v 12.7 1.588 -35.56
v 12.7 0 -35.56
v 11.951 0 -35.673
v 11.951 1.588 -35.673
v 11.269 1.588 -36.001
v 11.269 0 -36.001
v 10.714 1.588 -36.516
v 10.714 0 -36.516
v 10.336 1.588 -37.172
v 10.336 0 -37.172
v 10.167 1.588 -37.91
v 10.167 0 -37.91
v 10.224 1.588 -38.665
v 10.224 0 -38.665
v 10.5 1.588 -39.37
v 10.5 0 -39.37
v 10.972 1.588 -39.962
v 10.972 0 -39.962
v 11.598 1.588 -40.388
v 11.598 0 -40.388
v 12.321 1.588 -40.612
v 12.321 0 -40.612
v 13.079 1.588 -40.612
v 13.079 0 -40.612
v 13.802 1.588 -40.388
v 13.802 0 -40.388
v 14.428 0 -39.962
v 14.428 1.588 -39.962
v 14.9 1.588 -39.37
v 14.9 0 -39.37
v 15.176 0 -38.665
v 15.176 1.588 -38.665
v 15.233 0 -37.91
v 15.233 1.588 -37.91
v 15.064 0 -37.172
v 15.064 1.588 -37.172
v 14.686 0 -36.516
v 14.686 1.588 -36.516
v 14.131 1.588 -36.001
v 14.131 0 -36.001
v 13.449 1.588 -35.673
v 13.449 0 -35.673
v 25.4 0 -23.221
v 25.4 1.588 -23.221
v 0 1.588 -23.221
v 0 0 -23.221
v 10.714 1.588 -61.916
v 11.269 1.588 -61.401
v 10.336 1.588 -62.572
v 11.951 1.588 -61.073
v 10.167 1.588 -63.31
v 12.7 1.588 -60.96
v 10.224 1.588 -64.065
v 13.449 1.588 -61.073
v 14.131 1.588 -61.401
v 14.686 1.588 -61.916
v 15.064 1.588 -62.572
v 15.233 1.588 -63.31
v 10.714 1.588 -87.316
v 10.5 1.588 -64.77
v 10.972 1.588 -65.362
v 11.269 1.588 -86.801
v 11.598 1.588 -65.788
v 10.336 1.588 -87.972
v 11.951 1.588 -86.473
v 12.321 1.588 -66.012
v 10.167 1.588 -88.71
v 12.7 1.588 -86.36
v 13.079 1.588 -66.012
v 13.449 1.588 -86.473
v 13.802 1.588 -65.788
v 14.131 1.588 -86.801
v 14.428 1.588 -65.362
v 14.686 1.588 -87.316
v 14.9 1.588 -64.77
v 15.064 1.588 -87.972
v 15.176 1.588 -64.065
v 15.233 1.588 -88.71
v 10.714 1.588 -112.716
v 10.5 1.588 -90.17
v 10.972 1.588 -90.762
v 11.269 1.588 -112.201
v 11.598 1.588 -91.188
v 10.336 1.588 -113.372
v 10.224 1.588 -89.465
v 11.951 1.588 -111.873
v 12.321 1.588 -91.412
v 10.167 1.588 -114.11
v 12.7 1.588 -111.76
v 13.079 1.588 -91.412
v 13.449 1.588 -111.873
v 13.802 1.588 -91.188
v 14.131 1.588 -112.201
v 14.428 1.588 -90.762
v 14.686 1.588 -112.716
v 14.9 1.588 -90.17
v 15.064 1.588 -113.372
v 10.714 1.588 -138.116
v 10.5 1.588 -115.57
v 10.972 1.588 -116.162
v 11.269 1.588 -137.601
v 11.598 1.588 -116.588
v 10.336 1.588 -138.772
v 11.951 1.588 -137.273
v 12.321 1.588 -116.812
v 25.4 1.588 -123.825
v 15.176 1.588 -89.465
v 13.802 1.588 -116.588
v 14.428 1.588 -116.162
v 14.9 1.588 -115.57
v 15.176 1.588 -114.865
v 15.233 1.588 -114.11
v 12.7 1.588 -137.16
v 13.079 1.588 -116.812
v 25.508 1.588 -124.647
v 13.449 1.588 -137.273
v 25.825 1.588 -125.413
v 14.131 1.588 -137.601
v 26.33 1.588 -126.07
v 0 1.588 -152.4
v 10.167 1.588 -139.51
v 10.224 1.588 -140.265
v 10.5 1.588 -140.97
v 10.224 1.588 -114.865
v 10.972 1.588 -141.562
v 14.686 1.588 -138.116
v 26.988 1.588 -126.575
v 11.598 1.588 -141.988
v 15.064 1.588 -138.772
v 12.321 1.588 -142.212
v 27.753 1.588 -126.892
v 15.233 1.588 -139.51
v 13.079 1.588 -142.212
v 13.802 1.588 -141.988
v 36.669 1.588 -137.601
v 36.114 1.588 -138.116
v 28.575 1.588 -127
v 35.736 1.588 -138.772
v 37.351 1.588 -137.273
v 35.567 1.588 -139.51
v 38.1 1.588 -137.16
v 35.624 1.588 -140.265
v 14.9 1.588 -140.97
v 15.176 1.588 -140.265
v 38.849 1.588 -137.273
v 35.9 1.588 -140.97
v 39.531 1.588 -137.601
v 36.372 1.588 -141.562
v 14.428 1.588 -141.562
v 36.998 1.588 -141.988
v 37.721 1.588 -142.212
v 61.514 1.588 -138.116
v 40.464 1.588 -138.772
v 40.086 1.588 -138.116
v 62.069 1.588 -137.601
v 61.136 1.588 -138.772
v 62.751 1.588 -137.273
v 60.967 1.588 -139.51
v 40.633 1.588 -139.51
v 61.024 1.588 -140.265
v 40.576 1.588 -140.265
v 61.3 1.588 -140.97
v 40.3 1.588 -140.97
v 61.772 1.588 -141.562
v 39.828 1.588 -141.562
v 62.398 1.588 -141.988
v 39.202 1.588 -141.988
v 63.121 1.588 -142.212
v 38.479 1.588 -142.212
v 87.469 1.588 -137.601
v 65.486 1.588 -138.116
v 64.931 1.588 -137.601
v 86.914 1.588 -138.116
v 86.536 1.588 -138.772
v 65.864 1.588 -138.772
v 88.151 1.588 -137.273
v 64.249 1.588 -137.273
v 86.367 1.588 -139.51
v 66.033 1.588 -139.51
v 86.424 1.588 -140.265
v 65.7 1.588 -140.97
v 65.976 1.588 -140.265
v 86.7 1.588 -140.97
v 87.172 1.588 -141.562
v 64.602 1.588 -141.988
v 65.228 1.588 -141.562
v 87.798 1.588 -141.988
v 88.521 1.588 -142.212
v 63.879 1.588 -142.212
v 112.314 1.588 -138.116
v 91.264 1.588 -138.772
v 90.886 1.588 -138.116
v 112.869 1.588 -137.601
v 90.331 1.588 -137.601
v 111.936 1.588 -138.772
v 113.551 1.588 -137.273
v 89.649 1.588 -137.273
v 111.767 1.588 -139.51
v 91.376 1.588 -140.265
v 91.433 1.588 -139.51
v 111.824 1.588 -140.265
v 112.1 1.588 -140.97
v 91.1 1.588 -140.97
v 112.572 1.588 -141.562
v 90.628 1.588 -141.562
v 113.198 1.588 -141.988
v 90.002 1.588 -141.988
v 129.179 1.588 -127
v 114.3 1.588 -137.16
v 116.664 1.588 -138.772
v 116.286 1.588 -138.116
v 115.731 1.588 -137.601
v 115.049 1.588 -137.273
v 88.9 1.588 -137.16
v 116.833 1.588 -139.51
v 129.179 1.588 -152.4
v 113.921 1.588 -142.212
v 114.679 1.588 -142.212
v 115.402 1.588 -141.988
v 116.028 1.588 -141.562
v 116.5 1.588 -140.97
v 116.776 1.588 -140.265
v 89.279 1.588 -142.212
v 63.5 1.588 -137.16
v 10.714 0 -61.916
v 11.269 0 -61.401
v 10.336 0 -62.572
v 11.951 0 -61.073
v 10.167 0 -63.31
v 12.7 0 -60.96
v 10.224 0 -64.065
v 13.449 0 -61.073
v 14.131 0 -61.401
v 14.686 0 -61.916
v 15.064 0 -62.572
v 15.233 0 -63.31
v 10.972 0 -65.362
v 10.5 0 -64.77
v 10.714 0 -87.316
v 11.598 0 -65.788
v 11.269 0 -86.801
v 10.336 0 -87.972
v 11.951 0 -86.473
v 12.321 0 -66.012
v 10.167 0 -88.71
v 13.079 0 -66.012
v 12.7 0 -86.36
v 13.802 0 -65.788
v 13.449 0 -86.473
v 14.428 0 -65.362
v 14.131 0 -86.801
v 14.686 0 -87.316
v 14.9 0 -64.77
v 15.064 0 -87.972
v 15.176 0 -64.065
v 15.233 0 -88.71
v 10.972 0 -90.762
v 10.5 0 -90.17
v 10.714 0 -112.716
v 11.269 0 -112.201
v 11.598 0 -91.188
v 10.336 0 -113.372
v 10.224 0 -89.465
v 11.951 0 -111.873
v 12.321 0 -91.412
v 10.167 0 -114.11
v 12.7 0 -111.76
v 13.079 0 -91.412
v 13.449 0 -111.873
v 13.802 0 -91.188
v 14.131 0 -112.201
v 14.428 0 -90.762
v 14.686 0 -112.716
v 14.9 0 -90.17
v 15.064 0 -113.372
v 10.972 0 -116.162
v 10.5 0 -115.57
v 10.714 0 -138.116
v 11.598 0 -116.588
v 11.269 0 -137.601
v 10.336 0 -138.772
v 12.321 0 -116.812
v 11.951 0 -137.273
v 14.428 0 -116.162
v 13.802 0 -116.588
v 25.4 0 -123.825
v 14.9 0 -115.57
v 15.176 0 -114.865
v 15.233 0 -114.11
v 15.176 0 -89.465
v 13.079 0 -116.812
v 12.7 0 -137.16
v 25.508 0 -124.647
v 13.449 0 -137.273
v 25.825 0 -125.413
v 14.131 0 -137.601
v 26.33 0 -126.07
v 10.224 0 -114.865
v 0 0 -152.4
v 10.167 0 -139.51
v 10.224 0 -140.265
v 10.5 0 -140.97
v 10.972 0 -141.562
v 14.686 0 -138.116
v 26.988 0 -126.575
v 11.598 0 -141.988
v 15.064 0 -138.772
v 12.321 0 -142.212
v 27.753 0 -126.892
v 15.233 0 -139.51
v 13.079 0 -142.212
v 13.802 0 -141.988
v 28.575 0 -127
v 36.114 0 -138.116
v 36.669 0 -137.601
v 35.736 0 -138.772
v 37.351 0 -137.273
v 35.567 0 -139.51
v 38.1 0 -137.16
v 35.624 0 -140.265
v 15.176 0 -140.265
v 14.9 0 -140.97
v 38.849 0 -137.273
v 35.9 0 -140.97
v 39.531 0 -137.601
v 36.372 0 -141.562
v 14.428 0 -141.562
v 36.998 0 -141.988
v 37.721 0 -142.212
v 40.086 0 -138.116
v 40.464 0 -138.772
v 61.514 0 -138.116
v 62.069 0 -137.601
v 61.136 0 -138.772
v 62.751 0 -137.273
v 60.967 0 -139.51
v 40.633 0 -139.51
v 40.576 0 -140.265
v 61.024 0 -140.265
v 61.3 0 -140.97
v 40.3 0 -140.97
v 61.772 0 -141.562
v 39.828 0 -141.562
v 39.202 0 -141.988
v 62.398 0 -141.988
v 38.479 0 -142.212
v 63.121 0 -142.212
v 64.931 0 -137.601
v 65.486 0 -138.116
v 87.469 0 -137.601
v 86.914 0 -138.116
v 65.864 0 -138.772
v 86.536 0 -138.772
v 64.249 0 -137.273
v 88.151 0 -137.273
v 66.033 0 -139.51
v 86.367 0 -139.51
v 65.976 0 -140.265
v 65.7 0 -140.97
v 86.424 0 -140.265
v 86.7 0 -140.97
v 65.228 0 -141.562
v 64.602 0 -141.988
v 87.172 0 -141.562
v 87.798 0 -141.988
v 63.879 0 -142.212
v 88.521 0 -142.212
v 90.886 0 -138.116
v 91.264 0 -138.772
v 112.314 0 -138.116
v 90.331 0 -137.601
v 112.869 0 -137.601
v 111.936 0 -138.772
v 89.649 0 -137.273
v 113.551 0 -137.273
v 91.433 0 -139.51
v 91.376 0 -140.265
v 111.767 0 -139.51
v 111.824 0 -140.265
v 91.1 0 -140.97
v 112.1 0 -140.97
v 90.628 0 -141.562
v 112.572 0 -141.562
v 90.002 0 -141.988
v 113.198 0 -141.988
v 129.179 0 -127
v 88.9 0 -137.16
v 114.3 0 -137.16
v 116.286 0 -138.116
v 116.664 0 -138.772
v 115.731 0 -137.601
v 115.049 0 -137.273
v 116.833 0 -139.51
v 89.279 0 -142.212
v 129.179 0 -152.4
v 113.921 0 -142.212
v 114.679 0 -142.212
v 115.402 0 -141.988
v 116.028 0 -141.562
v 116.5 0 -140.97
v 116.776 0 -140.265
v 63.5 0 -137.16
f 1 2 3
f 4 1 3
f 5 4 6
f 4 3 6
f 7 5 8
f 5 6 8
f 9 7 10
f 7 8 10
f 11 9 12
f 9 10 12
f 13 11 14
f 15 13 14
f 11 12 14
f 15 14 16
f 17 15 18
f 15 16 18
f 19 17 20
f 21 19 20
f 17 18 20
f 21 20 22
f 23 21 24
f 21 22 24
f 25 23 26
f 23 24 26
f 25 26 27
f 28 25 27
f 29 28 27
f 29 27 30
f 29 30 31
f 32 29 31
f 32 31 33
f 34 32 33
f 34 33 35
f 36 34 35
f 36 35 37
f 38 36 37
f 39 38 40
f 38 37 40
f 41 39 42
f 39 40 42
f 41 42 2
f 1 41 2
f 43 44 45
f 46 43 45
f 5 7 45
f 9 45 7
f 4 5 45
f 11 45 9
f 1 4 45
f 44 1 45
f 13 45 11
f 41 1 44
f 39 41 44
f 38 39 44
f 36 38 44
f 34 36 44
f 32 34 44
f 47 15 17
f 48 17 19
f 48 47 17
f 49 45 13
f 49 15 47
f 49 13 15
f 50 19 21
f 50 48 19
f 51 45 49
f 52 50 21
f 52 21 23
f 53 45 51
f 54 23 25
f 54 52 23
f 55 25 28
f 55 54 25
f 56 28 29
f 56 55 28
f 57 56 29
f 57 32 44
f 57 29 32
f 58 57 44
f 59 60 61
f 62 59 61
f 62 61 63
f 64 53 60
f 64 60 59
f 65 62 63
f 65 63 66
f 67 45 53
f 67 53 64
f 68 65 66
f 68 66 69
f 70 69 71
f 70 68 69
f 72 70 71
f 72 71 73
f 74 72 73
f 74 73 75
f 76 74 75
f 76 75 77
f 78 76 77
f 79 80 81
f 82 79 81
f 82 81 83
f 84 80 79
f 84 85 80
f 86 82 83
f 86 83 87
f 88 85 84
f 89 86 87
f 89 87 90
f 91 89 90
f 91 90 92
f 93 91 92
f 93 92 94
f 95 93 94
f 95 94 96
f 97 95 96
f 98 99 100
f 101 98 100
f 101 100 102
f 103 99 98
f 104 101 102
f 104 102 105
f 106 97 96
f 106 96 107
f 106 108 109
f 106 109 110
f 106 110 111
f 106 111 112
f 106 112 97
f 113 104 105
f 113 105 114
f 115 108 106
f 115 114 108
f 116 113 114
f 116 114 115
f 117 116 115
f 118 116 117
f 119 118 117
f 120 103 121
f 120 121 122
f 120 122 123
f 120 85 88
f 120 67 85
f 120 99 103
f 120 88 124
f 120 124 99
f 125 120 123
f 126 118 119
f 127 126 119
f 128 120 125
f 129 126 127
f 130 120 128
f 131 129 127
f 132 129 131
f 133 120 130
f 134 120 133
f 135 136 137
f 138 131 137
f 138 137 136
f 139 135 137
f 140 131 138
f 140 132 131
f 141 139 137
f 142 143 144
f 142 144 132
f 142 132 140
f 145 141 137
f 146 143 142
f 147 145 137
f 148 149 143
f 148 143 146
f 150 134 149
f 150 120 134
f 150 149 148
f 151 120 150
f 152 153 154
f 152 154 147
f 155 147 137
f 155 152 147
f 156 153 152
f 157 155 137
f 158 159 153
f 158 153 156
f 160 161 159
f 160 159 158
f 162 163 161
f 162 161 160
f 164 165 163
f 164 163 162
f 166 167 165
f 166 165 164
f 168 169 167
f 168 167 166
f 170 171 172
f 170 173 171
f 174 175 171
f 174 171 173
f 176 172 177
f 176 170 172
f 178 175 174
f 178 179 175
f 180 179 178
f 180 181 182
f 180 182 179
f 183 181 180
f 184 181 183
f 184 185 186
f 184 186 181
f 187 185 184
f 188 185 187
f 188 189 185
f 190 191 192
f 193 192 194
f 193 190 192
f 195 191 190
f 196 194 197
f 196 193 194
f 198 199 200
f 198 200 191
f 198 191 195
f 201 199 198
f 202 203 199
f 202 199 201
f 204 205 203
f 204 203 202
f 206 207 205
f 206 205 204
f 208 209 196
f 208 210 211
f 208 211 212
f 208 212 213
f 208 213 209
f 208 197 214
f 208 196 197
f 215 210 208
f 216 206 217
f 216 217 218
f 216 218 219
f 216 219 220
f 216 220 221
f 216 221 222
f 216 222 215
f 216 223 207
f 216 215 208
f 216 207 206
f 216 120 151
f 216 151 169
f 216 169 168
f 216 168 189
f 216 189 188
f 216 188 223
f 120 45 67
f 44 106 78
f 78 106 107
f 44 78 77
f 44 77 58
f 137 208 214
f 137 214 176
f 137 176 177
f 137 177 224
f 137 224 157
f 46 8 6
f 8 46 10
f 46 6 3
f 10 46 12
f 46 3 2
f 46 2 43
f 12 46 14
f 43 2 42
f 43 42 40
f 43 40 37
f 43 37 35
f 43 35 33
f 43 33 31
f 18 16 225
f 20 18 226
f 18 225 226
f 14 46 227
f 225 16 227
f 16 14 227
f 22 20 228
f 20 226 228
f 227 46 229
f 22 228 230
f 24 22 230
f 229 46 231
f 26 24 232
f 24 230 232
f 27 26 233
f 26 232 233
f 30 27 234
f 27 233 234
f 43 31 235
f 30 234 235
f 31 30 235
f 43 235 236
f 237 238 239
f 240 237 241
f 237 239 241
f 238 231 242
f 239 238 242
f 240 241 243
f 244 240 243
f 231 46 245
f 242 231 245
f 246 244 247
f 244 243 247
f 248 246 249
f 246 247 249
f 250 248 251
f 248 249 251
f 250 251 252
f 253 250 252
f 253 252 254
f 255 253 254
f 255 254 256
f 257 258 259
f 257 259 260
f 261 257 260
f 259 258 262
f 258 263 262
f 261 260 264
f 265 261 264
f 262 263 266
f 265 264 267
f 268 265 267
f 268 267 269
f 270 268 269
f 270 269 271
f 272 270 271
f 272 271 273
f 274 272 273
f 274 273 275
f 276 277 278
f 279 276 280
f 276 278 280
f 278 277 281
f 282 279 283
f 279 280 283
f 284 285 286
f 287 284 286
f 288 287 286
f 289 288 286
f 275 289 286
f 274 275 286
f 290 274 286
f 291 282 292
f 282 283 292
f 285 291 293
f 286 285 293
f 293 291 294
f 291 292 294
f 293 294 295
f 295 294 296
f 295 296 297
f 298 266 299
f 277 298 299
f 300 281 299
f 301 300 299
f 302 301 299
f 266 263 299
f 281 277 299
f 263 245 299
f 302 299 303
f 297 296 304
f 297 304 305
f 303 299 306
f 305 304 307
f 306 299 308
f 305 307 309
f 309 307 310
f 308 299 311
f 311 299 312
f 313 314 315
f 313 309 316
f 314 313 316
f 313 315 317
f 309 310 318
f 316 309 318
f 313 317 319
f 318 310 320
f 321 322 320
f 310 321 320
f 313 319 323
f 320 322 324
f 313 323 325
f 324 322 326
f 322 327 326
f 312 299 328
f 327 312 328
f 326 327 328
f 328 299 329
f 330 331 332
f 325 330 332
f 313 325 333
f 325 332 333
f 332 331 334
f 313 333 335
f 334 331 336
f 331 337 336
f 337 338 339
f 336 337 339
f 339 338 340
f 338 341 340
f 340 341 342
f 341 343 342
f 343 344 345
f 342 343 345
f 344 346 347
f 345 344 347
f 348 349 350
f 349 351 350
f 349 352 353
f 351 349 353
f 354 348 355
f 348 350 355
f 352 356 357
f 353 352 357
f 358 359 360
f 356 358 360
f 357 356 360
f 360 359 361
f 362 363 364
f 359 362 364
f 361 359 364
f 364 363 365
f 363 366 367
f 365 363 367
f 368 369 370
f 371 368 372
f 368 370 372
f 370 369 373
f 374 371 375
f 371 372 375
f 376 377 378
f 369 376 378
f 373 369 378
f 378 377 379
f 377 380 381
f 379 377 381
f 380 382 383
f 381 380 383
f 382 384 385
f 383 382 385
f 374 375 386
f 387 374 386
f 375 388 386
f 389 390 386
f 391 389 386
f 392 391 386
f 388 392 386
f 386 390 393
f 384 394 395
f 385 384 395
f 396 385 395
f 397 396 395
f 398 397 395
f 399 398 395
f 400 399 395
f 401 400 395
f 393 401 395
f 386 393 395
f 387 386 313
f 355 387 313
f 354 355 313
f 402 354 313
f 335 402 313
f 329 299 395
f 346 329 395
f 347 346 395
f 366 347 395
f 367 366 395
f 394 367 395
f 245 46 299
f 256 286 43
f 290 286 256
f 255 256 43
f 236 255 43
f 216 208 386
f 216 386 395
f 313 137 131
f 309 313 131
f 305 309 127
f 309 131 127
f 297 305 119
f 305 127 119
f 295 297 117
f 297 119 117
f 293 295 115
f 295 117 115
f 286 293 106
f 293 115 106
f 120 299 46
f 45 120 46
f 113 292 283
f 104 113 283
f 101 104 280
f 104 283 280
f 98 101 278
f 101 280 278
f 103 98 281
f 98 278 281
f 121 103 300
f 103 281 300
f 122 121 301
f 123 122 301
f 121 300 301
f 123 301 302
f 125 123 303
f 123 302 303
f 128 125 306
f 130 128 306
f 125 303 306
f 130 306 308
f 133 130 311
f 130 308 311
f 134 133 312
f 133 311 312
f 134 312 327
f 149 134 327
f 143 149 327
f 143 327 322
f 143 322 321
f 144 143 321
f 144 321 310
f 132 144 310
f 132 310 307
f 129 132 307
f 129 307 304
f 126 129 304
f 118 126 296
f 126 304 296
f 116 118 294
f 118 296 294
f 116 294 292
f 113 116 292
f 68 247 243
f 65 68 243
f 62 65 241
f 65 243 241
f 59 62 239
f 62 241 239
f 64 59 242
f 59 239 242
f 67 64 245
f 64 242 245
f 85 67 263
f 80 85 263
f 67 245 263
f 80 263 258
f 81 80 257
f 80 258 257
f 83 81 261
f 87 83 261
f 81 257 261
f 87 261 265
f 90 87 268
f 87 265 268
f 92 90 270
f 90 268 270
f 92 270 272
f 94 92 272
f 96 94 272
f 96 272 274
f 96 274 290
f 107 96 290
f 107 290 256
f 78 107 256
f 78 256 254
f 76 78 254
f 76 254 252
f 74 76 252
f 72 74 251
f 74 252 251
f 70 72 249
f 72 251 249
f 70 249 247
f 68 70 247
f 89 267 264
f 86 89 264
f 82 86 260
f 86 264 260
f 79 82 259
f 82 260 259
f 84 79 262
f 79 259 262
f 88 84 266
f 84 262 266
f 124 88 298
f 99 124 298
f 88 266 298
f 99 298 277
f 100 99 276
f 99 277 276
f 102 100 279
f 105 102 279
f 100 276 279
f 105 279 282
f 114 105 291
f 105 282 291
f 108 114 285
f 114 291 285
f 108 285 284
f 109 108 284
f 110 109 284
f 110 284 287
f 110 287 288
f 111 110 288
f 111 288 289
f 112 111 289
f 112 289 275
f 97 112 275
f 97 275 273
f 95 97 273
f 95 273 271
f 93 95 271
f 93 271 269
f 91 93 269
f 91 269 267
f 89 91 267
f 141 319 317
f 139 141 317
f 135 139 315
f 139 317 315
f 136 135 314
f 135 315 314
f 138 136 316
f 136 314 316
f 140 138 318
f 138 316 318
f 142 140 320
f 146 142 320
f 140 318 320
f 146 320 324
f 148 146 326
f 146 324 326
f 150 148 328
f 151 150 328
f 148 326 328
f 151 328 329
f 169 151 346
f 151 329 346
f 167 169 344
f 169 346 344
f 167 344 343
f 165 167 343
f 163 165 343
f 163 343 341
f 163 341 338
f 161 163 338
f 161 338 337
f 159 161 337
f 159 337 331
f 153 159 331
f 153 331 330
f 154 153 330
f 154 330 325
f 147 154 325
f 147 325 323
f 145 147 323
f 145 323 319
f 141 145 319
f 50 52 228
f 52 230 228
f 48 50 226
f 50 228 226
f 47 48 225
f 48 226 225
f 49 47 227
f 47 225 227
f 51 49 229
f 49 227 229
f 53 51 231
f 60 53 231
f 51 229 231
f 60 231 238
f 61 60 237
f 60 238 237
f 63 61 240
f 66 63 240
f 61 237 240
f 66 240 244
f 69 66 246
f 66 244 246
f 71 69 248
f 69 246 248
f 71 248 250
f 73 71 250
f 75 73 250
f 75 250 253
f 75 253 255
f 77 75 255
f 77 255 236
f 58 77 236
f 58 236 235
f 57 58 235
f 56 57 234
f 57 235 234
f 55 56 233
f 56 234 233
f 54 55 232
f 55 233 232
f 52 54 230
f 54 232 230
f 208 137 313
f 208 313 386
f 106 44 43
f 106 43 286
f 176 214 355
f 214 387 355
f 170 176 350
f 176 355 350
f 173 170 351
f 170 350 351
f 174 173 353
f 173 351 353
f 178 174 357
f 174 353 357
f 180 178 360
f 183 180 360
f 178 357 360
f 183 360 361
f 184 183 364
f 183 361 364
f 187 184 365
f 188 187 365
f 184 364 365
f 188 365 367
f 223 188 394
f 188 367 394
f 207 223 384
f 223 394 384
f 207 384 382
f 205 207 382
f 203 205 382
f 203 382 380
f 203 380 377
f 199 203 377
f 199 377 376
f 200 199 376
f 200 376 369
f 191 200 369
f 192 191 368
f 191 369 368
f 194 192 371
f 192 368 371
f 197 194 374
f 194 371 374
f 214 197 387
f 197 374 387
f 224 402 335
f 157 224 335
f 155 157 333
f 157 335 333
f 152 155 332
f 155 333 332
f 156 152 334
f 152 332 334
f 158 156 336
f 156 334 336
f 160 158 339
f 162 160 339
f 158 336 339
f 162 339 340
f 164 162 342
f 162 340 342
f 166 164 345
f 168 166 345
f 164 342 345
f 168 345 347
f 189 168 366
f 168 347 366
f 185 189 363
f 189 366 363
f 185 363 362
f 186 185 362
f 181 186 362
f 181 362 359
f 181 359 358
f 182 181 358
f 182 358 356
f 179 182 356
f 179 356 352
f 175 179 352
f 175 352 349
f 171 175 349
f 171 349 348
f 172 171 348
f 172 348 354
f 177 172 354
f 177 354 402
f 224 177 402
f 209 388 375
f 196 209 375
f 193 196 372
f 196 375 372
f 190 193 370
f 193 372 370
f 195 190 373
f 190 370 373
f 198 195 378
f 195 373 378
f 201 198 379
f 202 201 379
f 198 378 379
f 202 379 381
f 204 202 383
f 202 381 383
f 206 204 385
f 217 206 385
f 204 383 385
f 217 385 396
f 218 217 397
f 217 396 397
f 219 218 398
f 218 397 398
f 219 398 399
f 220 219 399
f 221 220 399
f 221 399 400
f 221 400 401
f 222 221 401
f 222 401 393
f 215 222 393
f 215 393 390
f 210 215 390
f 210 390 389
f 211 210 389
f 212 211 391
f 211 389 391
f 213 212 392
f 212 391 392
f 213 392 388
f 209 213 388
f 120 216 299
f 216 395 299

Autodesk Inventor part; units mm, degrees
ref_plane "YZ Plane" through (0, 0, 0) normal (1, 0, 0) x (0, 1, 0)
ref_plane "XZ Plane" through (0, 0, 0) normal (0, 1, 0) x (-1, 0, 0)
ref_plane "XY Plane" through (0, 0, 0) normal (0, 0, 1) x (1, 0, 0)
sketch "Sketch1" plane through (0, 0, 0) normal (0, 1, 0) x (-1, 0, 0)
  line L0 (0, 0) -> (-25.4, 0)
  line L1 (-25.4, -35.921) -> (-25.4, -127)
  line L2 (-25.4, -152.4) -> (0, -152.4)
  line L3 (0, -152.4) -> (0, 0)
  line L4 (0, -152.4) -> (-152.4, -152.4)
  line L5 (-152.4, -152.4) -> (-152.4, -127)
  line L6 (-116.479, -127) -> (-25.4, -127)
  line L7 (0, -127) -> (0, -152.4)
  line L8 (-152.4, -127) -> (-25.4, 0)
  line L9 (-25.4, -35.921) -> (-116.479, -127)
  dimension "d0" = 25.4
  dimension "d1" = 152.4
  dimension "d2" = 152.4
  dimension "d3" = 25.4
  dimension "d4" = 25.4
extrude "Extrusion1" add sketch "Sketch1" along normal blind 1.5875
sketch "Sketch2" plane through (0, 1.5875, 0) normal (0, 1, 0) x (1, 0, 0)
  line L0 (152.4, 152.4) -> (0, 152.4) projected
  line L1 (0, 152.4) -> (25.4, 152.4)
  line L2 (25.4, 35.921) -> (25.4, 127) projected
  line L3 (25.4, 152.4) -> (25.4, 127)
  line L4 (25.4, 127) -> (0, 152.4)
  line L5 (25.4, 152.4) -> (0, 127)
  line L6 (0, 152.4) -> (0, 0) projected
  line L7 (12.7, 139.7) -> (38.1, 139.7)
  line L8 (38.1, 139.7) -> (63.5, 139.7)
  line L9 (63.5, 139.7) -> (88.9, 139.7)
  line L10 (88.9, 139.7) -> (114.3, 139.7)
  line L11 (114.3, 139.7) -> (139.7, 139.7)
  line L12 (12.7, 139.7) -> (12.7, 114.3)
  line L13 (12.7, 114.3) -> (12.7, 88.9)
  line L14 (12.7, 88.9) -> (12.7, 63.5)
  line L15 (12.7, 63.5) -> (12.7, 38.1)
  line L16 (12.7, 38.1) -> (12.7, 12.7)
  circle A0 centre (12.7, 139.7) radius 2.54
  circle A1 centre (38.1, 139.7) radius 2.54
  circle A2 centre (63.5, 139.7) radius 2.54
  circle A3 centre (88.9, 139.7) radius 2.54
  circle A4 centre (114.3, 139.7) radius 2.54
  circle A5 centre (139.7, 139.7) radius 2.54
  circle A6 centre (12.7, 114.3) radius 2.54
  circle A7 centre (12.7, 88.9) radius 2.54
  circle A8 centre (12.7, 63.5) radius 2.54
  circle A9 centre (12.7, 38.1) radius 2.54
  circle A10 centre (12.7, 12.7) radius 2.54
  dimension "d7" = 25.4
  dimension "d8" = 25.4
  dimension "d9" = 25.4
  dimension "d10" = 25.4
  dimension "d11" = 25.4
  dimension "d12" = 25.4
  dimension "d13" = 25.4
  dimension "d14" = 25.4
  dimension "d15" = 25.4
  dimension "d16" = 25.4
  dimension "d17" = 5.08
  dimension "d18" = 5.08
  dimension "d19" = 5.08
  dimension "d20" = 5.08
  dimension "d21" = 5.08
  dimension "d22" = 5.08
  dimension "d23" = 5.08
  dimension "d24" = 5.08
hole "Hole1" at (12.7, 1.5875, -139.7) at (38.1, 1.5875, -139.7) at (63.5, 1.5875, -139.7) at (88.9, 1.5875, -139.7) at (114.3, 1.5875, -139.7) at (12.7, 1.5875, -114.3) at (12.7, 1.5875, -88.9) at (12.7, 1.5875, -63.5) at (12.7, 1.5875, -38.1) direction (0, -1, 0) diameter 5.08 end through all
sketch "Sketch3" plane through (0, 1.5875, 0) normal (0, 1, 0) x (1, 0, 0)
  line L0 (116.479, 127) -> (25.4, 127) projected
  line L1 (116.479, 127) -> (129.179, 127)
  line L2 (129.179, 127) -> (129.179, 152.4)
  line L3 (152.4, 152.4) -> (0, 152.4) projected
  line L4 (25.4, 35.921) -> (25.4, 127) projected
  line L5 (25.4, 35.921) -> (25.4, 23.221)
  line L6 (25.4, 23.221) -> (0, 23.221)
  line L7 (0, 23.221) -> (0, 0)
  line L8 (25.4, 0) -> (152.4, 127) projected
  line L9 (0, 0) -> (25.4, 0)
  line L10 (25.4, 0) -> (152.4, 127)
  line L11 (152.4, 127) -> (152.4, 152.4) projected
  line L12 (152.4, 127) -> (152.4, 152.4)
  line L13 (152.4, 152.4) -> (129.179, 152.4)
  line L14 (116.479, 127) -> (25.4, 35.921)
  dimension "d32" = 12.7
  dimension "d33" = 12.7
extrude "Extrusion2" cut sketch "Sketch3" against normal blind 1.5875 contours L1 L2 L3 L11 L8 L9 L7 L6 L5 L14
sketch "Sketch4" plane through (0, 1.5875, 0) normal (0, 1, 0) x (1, 0, 0)
  line L0 (129.179, 127) -> (25.4, 127) projected
  line L1 (129.179, 127) -> (25.4, 23.221)
  line L2 (25.4, 59.142) -> (93.258, 127)
  line L3 (25.4, 127) -> (25.4, 23.221) projected
  line L4 (25.4, 59.142) -> (25.4, 23.221)
  point P0 (0, 0)
  dimension "d36" = 25.4
extrude "Extrusion3" add sketch "Sketch4" against normal blind 1.5875 contours L1 L3 L2 L0
fillet "Fillet1" radius 3.175 3 edges at (25.4, 0.7937, -127) (93.258, 0.7937, -127) (25.4, 0.7937, -59.142)
sketch "Sketch5" plane through (0, 1.5875, 0) normal (0, 1, 0) x (1, 0, 0)
  line L0 (25.4, 123.825) -> (25.4, 66.8072) projected
  line L1 (25.4, 23.221) -> (25.4, 123.825)
  line L2 (85.5928, 127) -> (28.575, 127) projected
  line L3 (28.575, 127) -> (135.0414, 127)
  line L4 (135.0414, 127) -> (135.0414, 23.221)
  line L5 (135.0414, 23.221) -> (25.4, 23.221)
  line L6 (28.575, 127) -> (85.5928, 127) projected
  line L7 (28.575, 127) -> (25.4, 123.825)
  point P0 (0, 0)
extrude "Extrusion4" cut sketch "Sketch5" against normal blind 25.4
properties part number "Gusset 2B 2.0"
